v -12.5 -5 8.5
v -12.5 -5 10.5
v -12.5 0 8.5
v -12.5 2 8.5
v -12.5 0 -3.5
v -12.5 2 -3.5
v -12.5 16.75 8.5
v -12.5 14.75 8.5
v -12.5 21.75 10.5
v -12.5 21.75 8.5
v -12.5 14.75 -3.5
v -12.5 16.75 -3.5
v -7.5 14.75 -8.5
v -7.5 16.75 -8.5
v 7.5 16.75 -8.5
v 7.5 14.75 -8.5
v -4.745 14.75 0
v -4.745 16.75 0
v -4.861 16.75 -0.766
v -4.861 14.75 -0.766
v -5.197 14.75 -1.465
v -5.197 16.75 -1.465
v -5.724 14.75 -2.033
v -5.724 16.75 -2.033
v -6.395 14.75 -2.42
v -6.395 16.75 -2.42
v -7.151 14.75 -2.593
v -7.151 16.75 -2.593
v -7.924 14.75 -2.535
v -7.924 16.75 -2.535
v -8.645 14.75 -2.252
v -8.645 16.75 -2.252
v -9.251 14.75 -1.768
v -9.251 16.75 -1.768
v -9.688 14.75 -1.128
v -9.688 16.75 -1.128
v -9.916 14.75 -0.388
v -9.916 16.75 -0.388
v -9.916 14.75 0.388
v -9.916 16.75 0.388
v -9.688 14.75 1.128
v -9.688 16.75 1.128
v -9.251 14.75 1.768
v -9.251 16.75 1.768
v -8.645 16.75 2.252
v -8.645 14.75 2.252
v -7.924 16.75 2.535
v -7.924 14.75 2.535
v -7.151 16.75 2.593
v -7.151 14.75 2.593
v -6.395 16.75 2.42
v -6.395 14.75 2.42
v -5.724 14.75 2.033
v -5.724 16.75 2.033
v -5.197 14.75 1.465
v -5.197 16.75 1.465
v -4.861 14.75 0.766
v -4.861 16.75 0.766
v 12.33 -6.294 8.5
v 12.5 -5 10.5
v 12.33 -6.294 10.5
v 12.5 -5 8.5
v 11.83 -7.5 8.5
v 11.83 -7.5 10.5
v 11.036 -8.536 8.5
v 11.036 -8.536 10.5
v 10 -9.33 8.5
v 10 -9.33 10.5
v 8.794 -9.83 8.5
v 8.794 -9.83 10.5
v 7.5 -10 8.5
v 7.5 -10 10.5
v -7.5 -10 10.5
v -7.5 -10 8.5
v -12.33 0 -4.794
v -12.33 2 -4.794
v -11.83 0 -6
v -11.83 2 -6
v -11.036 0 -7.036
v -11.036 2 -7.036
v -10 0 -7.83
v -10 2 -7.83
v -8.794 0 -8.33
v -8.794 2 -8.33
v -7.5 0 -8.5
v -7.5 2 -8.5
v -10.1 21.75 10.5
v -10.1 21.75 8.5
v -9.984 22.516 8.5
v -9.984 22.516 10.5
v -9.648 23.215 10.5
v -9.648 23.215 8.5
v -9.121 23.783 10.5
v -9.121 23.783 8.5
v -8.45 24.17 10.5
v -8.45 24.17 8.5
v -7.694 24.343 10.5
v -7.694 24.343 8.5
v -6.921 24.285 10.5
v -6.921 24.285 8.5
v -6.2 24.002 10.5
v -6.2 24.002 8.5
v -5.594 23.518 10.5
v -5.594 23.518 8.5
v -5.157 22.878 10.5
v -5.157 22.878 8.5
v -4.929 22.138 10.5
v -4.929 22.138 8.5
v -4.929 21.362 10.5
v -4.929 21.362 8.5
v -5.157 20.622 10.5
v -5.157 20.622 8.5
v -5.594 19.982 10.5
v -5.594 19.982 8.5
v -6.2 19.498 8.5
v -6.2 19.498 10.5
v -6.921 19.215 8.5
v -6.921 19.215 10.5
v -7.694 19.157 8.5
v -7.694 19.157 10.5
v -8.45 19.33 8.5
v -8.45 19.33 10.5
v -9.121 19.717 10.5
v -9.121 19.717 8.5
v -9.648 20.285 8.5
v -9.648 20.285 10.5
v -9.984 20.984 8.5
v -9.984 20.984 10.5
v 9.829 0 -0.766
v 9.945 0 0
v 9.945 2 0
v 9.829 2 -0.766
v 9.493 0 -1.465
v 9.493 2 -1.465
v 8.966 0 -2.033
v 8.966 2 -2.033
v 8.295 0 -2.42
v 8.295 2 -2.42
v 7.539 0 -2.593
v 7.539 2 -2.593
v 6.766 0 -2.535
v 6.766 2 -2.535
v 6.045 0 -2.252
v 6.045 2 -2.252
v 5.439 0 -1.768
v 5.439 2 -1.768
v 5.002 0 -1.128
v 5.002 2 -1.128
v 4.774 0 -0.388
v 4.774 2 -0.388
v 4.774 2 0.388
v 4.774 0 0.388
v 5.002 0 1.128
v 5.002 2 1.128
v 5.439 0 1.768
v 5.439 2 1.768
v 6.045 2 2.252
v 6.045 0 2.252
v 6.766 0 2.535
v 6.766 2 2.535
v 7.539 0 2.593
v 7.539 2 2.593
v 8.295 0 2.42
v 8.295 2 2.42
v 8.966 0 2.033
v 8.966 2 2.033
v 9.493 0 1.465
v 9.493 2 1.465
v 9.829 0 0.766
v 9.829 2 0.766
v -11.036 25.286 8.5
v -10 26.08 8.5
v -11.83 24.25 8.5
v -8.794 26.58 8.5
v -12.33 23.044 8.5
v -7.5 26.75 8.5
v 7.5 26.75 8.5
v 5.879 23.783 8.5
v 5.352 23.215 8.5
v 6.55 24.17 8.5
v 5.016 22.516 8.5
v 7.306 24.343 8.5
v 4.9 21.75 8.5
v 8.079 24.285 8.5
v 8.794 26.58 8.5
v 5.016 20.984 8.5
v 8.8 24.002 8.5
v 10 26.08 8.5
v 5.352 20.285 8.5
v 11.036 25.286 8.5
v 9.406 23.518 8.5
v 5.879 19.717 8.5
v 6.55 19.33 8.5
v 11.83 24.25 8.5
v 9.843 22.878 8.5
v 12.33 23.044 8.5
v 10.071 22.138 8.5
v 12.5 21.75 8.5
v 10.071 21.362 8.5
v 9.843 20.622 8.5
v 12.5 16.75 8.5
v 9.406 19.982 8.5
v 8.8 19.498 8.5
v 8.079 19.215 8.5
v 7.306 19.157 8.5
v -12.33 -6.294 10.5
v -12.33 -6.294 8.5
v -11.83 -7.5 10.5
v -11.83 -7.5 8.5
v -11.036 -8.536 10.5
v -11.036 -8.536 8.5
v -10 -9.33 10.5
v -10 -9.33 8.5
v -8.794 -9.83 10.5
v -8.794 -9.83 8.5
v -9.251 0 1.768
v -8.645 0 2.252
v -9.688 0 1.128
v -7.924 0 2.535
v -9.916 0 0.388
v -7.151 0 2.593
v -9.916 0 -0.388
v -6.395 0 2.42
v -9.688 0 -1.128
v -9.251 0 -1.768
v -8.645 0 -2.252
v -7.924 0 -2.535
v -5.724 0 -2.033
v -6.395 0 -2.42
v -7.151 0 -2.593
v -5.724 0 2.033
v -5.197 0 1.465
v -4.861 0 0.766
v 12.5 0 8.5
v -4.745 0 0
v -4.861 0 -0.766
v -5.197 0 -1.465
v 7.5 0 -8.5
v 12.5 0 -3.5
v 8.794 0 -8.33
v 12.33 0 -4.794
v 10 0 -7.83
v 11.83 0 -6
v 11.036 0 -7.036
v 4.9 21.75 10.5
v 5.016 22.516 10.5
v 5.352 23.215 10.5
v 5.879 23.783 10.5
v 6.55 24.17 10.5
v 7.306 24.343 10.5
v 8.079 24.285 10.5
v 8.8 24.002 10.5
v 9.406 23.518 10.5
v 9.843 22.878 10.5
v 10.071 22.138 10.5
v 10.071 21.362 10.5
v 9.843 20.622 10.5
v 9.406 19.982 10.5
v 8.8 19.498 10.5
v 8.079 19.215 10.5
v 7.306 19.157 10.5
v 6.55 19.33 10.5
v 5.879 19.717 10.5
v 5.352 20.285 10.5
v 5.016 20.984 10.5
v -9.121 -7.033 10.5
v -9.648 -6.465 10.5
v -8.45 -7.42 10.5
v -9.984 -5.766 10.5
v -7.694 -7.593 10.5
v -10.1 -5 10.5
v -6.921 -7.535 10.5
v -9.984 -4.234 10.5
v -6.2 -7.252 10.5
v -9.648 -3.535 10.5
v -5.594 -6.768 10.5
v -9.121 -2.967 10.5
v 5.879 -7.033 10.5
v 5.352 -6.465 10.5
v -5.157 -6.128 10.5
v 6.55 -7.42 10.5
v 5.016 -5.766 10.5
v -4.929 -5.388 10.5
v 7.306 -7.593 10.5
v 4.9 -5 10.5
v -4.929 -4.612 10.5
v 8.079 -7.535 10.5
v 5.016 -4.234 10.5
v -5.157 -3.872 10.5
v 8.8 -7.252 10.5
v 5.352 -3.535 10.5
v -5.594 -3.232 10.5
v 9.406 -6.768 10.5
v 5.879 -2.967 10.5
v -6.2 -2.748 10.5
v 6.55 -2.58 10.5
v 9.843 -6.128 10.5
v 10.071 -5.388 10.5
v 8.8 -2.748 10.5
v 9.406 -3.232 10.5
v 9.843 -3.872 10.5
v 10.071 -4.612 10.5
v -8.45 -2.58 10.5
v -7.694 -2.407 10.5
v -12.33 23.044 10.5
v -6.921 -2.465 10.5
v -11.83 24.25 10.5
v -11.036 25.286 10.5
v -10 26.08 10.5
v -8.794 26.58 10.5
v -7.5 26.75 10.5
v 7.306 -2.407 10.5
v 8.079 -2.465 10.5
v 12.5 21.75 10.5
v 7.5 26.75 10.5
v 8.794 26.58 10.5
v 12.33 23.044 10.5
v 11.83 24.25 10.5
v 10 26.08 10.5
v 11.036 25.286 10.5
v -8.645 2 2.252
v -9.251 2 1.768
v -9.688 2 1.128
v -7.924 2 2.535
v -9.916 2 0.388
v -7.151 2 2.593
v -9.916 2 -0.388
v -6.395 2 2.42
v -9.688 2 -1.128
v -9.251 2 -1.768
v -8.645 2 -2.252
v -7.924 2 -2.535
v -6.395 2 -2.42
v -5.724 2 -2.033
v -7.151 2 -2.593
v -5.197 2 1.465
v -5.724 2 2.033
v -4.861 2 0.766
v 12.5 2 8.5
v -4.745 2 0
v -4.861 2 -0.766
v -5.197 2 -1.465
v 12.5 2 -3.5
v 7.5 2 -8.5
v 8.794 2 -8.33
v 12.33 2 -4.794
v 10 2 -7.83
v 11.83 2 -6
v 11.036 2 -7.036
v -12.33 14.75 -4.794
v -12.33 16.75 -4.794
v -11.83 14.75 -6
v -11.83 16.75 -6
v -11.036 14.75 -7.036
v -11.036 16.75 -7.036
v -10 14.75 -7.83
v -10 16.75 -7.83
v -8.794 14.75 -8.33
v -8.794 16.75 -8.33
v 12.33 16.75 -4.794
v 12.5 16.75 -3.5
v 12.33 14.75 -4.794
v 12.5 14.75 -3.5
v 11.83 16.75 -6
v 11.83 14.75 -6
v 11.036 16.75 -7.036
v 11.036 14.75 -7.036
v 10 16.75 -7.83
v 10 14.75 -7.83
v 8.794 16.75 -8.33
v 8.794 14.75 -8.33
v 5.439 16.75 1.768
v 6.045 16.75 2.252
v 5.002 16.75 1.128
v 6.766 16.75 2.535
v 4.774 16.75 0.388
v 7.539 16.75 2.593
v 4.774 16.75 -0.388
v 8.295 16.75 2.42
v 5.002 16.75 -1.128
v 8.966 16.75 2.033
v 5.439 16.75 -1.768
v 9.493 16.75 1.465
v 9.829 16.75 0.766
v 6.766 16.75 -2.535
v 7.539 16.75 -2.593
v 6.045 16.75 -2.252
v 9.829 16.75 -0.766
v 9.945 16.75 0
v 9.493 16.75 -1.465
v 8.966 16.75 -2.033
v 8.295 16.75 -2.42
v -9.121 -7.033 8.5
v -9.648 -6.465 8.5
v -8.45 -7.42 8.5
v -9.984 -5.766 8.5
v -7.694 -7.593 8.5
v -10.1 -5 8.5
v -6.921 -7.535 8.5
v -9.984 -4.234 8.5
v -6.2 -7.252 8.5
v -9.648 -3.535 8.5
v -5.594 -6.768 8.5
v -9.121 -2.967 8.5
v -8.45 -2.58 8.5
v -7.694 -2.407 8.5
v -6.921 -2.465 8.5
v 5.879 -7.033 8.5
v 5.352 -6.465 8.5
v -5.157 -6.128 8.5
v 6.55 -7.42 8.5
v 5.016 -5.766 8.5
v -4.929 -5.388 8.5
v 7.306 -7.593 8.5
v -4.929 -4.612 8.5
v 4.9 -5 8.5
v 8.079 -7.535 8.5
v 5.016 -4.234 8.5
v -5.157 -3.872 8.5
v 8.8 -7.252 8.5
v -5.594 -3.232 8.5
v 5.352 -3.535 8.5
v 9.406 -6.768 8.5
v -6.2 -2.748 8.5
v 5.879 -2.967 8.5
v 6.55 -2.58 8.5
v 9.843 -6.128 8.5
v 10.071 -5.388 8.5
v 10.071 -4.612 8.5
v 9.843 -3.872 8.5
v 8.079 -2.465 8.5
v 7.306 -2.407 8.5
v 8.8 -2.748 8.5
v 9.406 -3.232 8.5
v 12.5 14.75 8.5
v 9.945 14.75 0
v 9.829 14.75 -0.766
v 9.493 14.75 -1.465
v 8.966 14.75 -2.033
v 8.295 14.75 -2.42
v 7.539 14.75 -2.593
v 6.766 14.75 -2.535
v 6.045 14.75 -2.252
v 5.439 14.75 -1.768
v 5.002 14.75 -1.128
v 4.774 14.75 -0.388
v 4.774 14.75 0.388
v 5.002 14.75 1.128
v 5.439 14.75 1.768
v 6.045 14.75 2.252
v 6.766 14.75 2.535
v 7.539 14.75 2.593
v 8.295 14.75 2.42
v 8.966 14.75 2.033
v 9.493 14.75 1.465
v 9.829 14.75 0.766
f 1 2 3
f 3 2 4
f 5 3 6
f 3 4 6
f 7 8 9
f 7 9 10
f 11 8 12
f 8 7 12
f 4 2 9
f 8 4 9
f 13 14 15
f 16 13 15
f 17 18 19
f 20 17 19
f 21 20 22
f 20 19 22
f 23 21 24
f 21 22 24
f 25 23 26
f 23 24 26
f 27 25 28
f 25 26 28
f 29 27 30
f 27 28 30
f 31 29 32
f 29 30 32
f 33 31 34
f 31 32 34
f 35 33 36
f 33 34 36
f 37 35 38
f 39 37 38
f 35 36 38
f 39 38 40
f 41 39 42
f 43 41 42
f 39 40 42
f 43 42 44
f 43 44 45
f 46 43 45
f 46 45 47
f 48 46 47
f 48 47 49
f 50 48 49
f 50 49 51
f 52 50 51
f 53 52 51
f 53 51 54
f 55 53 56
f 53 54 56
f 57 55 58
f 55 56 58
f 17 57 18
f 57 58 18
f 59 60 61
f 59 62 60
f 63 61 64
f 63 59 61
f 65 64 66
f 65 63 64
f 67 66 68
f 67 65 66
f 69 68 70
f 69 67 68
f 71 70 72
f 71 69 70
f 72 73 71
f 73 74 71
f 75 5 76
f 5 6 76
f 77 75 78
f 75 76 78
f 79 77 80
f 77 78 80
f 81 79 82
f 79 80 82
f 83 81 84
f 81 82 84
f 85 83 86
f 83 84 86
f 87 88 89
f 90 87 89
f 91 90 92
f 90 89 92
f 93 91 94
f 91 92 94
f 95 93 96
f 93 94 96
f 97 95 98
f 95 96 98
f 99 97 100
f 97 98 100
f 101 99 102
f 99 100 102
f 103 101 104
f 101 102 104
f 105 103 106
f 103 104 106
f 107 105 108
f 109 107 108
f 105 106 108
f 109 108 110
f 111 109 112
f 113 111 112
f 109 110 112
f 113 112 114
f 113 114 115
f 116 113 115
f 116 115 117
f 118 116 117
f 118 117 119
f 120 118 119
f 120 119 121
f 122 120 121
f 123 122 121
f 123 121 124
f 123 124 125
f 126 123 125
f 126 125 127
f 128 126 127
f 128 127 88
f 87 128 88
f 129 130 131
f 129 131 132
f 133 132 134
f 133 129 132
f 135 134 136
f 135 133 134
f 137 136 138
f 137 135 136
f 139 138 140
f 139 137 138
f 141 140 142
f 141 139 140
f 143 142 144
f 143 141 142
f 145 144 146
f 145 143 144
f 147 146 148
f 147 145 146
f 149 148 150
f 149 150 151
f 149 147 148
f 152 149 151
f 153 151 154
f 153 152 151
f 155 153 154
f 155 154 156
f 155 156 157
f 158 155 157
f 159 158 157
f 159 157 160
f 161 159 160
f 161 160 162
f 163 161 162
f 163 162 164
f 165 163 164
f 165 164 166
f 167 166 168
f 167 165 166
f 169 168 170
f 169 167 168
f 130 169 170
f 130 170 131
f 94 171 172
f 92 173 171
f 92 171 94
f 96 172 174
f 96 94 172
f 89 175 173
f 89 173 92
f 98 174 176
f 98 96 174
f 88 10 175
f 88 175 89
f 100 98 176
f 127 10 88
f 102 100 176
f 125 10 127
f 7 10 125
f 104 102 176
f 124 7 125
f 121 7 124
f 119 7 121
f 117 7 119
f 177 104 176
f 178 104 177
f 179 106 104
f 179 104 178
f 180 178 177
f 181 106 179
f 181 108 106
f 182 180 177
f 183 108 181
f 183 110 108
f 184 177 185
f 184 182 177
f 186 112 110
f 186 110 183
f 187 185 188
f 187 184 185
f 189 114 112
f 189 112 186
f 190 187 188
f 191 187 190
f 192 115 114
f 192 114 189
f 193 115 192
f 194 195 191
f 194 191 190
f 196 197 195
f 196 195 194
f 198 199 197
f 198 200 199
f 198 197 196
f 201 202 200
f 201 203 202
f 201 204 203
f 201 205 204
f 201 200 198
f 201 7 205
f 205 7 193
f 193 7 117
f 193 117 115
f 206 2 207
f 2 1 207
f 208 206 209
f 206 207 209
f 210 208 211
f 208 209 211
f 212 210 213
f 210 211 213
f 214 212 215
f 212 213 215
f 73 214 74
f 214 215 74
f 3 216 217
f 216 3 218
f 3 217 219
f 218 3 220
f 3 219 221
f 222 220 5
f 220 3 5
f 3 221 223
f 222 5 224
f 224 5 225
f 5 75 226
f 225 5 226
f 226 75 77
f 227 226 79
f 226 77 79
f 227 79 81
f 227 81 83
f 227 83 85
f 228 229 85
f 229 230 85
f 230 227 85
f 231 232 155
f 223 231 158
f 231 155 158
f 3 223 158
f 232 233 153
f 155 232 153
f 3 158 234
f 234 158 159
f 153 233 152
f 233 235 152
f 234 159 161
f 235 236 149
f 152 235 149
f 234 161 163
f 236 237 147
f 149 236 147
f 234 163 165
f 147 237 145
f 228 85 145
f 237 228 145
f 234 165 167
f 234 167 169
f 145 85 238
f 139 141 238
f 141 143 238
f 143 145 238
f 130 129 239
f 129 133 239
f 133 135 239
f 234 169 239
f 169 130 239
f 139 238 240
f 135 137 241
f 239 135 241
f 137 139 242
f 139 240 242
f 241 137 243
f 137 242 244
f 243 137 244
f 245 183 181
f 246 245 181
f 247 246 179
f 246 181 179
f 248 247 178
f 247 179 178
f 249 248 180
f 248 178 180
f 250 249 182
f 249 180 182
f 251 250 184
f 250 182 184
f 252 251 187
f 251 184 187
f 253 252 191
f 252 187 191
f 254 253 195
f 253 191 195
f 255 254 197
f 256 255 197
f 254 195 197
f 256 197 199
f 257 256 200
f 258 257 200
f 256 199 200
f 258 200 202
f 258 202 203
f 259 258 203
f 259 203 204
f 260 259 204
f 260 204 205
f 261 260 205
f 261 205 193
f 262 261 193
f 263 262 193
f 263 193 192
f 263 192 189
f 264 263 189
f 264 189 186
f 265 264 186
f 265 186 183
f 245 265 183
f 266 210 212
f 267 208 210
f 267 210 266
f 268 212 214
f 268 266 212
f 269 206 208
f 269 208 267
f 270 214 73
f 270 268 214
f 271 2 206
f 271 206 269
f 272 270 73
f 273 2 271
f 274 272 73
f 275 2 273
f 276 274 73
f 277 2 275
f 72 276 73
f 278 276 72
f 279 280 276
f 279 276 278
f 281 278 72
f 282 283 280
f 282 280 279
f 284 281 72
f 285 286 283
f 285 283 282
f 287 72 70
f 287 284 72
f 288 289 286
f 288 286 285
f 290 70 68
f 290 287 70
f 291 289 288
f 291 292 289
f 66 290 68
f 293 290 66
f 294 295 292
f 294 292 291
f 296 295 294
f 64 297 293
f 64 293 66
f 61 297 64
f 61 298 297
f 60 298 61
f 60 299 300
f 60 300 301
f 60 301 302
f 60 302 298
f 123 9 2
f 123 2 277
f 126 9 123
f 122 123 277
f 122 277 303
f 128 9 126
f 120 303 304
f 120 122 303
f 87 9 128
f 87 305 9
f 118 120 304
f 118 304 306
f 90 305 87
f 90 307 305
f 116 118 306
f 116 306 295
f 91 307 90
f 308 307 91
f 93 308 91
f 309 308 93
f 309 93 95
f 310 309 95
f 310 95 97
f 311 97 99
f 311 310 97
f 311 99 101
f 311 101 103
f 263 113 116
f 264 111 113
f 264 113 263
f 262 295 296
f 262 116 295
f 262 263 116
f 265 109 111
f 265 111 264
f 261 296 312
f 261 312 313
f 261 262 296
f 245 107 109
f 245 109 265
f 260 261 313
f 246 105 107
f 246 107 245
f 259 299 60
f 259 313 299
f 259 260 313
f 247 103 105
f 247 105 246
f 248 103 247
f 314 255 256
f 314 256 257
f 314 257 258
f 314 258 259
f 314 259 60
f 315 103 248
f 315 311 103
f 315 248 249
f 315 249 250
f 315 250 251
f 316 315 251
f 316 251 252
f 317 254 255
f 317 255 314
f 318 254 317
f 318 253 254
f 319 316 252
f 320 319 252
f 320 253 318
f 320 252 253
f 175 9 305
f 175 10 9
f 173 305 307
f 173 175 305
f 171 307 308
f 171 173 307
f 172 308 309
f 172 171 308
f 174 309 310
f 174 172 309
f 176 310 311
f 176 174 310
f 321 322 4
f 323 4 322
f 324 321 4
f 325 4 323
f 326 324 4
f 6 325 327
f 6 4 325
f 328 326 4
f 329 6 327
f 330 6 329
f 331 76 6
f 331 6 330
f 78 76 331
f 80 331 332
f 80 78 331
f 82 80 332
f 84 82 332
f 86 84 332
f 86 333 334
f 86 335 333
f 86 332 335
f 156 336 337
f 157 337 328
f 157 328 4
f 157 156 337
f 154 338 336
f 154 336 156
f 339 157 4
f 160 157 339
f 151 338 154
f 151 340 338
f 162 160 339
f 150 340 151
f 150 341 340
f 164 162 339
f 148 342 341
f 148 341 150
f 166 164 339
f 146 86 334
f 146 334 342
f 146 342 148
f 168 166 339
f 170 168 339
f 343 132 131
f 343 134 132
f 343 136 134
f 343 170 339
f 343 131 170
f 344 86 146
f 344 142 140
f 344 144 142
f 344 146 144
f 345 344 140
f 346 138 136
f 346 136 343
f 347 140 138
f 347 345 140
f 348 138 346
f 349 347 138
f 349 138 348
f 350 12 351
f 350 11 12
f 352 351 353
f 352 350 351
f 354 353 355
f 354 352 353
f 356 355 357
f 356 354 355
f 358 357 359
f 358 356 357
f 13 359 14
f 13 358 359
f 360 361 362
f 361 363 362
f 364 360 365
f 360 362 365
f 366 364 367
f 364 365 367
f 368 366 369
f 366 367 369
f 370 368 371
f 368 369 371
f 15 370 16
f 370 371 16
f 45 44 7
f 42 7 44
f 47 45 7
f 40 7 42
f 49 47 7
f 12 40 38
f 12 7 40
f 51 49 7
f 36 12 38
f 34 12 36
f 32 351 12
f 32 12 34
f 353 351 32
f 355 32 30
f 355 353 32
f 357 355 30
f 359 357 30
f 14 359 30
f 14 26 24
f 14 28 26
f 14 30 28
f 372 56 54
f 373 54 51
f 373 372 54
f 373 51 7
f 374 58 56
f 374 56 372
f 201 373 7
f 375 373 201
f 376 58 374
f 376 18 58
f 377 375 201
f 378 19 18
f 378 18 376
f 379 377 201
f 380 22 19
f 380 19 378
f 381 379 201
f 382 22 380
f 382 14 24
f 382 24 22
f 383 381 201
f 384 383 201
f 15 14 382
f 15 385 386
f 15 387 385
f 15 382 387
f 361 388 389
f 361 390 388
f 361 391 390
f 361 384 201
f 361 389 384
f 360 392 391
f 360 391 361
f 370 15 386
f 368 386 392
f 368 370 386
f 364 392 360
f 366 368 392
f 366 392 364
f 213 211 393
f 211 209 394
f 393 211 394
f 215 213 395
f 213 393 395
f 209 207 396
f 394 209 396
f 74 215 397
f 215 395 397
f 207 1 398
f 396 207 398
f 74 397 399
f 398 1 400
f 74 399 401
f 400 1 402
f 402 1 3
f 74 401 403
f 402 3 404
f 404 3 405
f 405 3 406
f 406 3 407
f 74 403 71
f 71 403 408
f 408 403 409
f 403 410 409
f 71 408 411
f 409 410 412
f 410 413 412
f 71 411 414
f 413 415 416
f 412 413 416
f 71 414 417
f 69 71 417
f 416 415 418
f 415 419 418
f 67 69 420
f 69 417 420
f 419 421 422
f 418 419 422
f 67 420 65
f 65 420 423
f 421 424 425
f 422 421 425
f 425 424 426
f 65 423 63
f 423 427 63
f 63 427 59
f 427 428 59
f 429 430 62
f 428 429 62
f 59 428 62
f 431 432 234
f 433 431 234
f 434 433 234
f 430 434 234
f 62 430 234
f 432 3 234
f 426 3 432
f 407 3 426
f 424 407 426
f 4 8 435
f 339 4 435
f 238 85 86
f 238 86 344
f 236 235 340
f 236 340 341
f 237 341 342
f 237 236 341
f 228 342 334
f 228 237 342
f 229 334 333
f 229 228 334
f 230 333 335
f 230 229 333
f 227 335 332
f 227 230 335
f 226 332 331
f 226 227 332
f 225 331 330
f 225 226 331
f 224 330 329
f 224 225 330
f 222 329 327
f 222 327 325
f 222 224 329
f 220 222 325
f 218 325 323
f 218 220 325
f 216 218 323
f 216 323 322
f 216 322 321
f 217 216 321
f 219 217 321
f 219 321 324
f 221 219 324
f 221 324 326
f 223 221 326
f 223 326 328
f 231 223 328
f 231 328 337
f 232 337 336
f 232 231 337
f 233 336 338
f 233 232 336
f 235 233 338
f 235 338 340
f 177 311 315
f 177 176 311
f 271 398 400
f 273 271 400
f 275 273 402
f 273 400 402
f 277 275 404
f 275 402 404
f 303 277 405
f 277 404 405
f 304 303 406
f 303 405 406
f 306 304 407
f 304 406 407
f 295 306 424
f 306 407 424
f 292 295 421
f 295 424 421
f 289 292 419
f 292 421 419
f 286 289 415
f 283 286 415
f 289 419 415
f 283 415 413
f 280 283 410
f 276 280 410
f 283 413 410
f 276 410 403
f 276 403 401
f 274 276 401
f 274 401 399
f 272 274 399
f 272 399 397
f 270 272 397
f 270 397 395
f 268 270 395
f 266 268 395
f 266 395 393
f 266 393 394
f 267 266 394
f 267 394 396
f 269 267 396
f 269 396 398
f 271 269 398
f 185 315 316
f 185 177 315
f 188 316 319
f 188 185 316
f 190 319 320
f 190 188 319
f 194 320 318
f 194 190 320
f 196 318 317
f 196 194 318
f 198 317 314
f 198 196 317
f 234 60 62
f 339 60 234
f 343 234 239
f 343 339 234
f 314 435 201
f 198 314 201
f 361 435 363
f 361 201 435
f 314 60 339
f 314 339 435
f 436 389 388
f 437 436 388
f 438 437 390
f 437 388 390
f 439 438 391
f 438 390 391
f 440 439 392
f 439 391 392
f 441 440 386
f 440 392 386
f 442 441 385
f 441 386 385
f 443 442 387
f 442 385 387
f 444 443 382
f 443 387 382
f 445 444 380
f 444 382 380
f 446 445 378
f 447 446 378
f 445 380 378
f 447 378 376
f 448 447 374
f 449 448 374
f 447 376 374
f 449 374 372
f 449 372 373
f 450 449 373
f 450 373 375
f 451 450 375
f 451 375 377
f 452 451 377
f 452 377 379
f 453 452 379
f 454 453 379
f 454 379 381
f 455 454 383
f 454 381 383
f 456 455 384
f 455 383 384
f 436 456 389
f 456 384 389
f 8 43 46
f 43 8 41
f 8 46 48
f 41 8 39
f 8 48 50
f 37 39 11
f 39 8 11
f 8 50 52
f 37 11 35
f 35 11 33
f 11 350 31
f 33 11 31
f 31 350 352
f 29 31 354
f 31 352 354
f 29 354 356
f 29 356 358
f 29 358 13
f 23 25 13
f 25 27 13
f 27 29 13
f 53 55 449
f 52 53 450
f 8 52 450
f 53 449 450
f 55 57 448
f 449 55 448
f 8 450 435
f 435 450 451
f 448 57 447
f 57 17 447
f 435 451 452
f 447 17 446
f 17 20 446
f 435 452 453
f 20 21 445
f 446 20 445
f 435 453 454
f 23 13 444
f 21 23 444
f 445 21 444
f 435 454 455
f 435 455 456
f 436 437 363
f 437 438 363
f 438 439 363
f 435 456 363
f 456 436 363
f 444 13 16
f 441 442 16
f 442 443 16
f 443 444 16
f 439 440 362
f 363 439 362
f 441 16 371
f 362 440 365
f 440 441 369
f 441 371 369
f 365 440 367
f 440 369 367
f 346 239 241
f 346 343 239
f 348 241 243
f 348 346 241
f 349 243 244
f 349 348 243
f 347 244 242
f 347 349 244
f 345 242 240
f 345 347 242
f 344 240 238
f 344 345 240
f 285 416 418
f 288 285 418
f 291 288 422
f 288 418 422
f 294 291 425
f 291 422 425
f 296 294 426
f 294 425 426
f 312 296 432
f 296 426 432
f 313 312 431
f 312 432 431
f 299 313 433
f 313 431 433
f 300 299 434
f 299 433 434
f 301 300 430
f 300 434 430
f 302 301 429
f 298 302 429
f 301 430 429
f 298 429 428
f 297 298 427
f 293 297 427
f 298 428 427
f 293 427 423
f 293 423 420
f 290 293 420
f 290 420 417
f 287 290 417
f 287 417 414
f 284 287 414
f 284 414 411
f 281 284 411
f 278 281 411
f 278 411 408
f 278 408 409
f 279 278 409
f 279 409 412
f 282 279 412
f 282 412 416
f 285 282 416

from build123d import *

# Parameters (mm, degrees)
SKETCH1_W           = 25
SKETCH1_H           = 17
SKETCH1_R           = 2.6
BOSS_EXTRUDE1_DEPTH = 2
SKETCH2_W           = 25
SKETCH2_H           = 14.75
BOSS_EXTRUDE2_DEPTH = 2
SKETCH3_W           = 25
SKETCH3_H           = 2
BOSS_EXTRUDE3_DEPTH = 10
FILLET1_R           = 5
SKETCH4_R           = 2.6
CUT_EXTRUDE1_DEPTH  = 10


with BuildPart() as part:
    # Sketch1 → Boss-Extrude1 (new body)
    with BuildSketch(Plane(origin=(0, 0, 0), x_dir=(1, 0, 0), z_dir=(0, 1, 0))):
        Rectangle(SKETCH1_W, SKETCH1_H)
        with Locations((-7.345, 0)):
            Circle(SKETCH1_R, mode=Mode.SUBTRACT)
        with Locations((7.345, 0)):
            Circle(SKETCH1_R, mode=Mode.SUBTRACT)
    extrude(amount=BOSS_EXTRUDE1_DEPTH)

    # Sketch2 → Boss-Extrude2 (add)
    with BuildSketch(Plane.XY.offset(8.5)):
        with Locations((0, 7.375)):
            Rectangle(SKETCH2_W, SKETCH2_H)
    extrude(amount=BOSS_EXTRUDE2_DEPTH)

    # Mirror2: part across plane


with BuildPart() as part_1:
    add(part.part)
    add(part.part.mirror(Plane.ZX.offset(8.375)))

    # Sketch3 → Boss-Extrude3 (add)
    with BuildSketch(Plane(origin=(0, 16.75, 0), x_dir=(1, 0, 0), z_dir=(0, 1, 0))):
        with Locations((0, -9.5)):
            Rectangle(SKETCH3_W, SKETCH3_H)
    extrude(amount=BOSS_EXTRUDE3_DEPTH)

    # Mirror3: part across plane


with BuildPart() as part_2:
    add(part_1.part)
    add(part_1.part.mirror(Plane.ZX.offset(8.375)))

    # Fillet1
    fillet1_edges = [part_2.edges().sort_by_distance(p)[0] for p in [
        (12.5, 15.75, -8.5),
        (-12.5, 15.75, -8.5),
        (-12.5, 26.75, 9.5),
        (12.5, 26.75, 9.5),
        (-12.5, 1, -8.5),
        (12.5, 1, -8.5),
        (-12.5, -10, 9.5),
        (12.5, -10, 9.5),
    ]]
    fillet(fillet1_edges, radius=FILLET1_R)

    # Sketch4 → Cut-Extrude1 (cut)
    with BuildSketch(Plane(origin=(0, 0, 8.5), x_dir=(-1, 0, 0), z_dir=(0, 0, -1))):
        with Locations((-7.5, 21.75)):
            Circle(SKETCH4_R)
        with Locations((7.5, 21.75)):
            Circle(SKETCH4_R)
        with Locations((7.5, -5)):
            Circle(SKETCH4_R)
        with Locations((-7.5, -5)):
            Circle(SKETCH4_R)
    extrude(amount=-CUT_EXTRUDE1_DEPTH, mode=Mode.SUBTRACT)


solid = part_2.part
